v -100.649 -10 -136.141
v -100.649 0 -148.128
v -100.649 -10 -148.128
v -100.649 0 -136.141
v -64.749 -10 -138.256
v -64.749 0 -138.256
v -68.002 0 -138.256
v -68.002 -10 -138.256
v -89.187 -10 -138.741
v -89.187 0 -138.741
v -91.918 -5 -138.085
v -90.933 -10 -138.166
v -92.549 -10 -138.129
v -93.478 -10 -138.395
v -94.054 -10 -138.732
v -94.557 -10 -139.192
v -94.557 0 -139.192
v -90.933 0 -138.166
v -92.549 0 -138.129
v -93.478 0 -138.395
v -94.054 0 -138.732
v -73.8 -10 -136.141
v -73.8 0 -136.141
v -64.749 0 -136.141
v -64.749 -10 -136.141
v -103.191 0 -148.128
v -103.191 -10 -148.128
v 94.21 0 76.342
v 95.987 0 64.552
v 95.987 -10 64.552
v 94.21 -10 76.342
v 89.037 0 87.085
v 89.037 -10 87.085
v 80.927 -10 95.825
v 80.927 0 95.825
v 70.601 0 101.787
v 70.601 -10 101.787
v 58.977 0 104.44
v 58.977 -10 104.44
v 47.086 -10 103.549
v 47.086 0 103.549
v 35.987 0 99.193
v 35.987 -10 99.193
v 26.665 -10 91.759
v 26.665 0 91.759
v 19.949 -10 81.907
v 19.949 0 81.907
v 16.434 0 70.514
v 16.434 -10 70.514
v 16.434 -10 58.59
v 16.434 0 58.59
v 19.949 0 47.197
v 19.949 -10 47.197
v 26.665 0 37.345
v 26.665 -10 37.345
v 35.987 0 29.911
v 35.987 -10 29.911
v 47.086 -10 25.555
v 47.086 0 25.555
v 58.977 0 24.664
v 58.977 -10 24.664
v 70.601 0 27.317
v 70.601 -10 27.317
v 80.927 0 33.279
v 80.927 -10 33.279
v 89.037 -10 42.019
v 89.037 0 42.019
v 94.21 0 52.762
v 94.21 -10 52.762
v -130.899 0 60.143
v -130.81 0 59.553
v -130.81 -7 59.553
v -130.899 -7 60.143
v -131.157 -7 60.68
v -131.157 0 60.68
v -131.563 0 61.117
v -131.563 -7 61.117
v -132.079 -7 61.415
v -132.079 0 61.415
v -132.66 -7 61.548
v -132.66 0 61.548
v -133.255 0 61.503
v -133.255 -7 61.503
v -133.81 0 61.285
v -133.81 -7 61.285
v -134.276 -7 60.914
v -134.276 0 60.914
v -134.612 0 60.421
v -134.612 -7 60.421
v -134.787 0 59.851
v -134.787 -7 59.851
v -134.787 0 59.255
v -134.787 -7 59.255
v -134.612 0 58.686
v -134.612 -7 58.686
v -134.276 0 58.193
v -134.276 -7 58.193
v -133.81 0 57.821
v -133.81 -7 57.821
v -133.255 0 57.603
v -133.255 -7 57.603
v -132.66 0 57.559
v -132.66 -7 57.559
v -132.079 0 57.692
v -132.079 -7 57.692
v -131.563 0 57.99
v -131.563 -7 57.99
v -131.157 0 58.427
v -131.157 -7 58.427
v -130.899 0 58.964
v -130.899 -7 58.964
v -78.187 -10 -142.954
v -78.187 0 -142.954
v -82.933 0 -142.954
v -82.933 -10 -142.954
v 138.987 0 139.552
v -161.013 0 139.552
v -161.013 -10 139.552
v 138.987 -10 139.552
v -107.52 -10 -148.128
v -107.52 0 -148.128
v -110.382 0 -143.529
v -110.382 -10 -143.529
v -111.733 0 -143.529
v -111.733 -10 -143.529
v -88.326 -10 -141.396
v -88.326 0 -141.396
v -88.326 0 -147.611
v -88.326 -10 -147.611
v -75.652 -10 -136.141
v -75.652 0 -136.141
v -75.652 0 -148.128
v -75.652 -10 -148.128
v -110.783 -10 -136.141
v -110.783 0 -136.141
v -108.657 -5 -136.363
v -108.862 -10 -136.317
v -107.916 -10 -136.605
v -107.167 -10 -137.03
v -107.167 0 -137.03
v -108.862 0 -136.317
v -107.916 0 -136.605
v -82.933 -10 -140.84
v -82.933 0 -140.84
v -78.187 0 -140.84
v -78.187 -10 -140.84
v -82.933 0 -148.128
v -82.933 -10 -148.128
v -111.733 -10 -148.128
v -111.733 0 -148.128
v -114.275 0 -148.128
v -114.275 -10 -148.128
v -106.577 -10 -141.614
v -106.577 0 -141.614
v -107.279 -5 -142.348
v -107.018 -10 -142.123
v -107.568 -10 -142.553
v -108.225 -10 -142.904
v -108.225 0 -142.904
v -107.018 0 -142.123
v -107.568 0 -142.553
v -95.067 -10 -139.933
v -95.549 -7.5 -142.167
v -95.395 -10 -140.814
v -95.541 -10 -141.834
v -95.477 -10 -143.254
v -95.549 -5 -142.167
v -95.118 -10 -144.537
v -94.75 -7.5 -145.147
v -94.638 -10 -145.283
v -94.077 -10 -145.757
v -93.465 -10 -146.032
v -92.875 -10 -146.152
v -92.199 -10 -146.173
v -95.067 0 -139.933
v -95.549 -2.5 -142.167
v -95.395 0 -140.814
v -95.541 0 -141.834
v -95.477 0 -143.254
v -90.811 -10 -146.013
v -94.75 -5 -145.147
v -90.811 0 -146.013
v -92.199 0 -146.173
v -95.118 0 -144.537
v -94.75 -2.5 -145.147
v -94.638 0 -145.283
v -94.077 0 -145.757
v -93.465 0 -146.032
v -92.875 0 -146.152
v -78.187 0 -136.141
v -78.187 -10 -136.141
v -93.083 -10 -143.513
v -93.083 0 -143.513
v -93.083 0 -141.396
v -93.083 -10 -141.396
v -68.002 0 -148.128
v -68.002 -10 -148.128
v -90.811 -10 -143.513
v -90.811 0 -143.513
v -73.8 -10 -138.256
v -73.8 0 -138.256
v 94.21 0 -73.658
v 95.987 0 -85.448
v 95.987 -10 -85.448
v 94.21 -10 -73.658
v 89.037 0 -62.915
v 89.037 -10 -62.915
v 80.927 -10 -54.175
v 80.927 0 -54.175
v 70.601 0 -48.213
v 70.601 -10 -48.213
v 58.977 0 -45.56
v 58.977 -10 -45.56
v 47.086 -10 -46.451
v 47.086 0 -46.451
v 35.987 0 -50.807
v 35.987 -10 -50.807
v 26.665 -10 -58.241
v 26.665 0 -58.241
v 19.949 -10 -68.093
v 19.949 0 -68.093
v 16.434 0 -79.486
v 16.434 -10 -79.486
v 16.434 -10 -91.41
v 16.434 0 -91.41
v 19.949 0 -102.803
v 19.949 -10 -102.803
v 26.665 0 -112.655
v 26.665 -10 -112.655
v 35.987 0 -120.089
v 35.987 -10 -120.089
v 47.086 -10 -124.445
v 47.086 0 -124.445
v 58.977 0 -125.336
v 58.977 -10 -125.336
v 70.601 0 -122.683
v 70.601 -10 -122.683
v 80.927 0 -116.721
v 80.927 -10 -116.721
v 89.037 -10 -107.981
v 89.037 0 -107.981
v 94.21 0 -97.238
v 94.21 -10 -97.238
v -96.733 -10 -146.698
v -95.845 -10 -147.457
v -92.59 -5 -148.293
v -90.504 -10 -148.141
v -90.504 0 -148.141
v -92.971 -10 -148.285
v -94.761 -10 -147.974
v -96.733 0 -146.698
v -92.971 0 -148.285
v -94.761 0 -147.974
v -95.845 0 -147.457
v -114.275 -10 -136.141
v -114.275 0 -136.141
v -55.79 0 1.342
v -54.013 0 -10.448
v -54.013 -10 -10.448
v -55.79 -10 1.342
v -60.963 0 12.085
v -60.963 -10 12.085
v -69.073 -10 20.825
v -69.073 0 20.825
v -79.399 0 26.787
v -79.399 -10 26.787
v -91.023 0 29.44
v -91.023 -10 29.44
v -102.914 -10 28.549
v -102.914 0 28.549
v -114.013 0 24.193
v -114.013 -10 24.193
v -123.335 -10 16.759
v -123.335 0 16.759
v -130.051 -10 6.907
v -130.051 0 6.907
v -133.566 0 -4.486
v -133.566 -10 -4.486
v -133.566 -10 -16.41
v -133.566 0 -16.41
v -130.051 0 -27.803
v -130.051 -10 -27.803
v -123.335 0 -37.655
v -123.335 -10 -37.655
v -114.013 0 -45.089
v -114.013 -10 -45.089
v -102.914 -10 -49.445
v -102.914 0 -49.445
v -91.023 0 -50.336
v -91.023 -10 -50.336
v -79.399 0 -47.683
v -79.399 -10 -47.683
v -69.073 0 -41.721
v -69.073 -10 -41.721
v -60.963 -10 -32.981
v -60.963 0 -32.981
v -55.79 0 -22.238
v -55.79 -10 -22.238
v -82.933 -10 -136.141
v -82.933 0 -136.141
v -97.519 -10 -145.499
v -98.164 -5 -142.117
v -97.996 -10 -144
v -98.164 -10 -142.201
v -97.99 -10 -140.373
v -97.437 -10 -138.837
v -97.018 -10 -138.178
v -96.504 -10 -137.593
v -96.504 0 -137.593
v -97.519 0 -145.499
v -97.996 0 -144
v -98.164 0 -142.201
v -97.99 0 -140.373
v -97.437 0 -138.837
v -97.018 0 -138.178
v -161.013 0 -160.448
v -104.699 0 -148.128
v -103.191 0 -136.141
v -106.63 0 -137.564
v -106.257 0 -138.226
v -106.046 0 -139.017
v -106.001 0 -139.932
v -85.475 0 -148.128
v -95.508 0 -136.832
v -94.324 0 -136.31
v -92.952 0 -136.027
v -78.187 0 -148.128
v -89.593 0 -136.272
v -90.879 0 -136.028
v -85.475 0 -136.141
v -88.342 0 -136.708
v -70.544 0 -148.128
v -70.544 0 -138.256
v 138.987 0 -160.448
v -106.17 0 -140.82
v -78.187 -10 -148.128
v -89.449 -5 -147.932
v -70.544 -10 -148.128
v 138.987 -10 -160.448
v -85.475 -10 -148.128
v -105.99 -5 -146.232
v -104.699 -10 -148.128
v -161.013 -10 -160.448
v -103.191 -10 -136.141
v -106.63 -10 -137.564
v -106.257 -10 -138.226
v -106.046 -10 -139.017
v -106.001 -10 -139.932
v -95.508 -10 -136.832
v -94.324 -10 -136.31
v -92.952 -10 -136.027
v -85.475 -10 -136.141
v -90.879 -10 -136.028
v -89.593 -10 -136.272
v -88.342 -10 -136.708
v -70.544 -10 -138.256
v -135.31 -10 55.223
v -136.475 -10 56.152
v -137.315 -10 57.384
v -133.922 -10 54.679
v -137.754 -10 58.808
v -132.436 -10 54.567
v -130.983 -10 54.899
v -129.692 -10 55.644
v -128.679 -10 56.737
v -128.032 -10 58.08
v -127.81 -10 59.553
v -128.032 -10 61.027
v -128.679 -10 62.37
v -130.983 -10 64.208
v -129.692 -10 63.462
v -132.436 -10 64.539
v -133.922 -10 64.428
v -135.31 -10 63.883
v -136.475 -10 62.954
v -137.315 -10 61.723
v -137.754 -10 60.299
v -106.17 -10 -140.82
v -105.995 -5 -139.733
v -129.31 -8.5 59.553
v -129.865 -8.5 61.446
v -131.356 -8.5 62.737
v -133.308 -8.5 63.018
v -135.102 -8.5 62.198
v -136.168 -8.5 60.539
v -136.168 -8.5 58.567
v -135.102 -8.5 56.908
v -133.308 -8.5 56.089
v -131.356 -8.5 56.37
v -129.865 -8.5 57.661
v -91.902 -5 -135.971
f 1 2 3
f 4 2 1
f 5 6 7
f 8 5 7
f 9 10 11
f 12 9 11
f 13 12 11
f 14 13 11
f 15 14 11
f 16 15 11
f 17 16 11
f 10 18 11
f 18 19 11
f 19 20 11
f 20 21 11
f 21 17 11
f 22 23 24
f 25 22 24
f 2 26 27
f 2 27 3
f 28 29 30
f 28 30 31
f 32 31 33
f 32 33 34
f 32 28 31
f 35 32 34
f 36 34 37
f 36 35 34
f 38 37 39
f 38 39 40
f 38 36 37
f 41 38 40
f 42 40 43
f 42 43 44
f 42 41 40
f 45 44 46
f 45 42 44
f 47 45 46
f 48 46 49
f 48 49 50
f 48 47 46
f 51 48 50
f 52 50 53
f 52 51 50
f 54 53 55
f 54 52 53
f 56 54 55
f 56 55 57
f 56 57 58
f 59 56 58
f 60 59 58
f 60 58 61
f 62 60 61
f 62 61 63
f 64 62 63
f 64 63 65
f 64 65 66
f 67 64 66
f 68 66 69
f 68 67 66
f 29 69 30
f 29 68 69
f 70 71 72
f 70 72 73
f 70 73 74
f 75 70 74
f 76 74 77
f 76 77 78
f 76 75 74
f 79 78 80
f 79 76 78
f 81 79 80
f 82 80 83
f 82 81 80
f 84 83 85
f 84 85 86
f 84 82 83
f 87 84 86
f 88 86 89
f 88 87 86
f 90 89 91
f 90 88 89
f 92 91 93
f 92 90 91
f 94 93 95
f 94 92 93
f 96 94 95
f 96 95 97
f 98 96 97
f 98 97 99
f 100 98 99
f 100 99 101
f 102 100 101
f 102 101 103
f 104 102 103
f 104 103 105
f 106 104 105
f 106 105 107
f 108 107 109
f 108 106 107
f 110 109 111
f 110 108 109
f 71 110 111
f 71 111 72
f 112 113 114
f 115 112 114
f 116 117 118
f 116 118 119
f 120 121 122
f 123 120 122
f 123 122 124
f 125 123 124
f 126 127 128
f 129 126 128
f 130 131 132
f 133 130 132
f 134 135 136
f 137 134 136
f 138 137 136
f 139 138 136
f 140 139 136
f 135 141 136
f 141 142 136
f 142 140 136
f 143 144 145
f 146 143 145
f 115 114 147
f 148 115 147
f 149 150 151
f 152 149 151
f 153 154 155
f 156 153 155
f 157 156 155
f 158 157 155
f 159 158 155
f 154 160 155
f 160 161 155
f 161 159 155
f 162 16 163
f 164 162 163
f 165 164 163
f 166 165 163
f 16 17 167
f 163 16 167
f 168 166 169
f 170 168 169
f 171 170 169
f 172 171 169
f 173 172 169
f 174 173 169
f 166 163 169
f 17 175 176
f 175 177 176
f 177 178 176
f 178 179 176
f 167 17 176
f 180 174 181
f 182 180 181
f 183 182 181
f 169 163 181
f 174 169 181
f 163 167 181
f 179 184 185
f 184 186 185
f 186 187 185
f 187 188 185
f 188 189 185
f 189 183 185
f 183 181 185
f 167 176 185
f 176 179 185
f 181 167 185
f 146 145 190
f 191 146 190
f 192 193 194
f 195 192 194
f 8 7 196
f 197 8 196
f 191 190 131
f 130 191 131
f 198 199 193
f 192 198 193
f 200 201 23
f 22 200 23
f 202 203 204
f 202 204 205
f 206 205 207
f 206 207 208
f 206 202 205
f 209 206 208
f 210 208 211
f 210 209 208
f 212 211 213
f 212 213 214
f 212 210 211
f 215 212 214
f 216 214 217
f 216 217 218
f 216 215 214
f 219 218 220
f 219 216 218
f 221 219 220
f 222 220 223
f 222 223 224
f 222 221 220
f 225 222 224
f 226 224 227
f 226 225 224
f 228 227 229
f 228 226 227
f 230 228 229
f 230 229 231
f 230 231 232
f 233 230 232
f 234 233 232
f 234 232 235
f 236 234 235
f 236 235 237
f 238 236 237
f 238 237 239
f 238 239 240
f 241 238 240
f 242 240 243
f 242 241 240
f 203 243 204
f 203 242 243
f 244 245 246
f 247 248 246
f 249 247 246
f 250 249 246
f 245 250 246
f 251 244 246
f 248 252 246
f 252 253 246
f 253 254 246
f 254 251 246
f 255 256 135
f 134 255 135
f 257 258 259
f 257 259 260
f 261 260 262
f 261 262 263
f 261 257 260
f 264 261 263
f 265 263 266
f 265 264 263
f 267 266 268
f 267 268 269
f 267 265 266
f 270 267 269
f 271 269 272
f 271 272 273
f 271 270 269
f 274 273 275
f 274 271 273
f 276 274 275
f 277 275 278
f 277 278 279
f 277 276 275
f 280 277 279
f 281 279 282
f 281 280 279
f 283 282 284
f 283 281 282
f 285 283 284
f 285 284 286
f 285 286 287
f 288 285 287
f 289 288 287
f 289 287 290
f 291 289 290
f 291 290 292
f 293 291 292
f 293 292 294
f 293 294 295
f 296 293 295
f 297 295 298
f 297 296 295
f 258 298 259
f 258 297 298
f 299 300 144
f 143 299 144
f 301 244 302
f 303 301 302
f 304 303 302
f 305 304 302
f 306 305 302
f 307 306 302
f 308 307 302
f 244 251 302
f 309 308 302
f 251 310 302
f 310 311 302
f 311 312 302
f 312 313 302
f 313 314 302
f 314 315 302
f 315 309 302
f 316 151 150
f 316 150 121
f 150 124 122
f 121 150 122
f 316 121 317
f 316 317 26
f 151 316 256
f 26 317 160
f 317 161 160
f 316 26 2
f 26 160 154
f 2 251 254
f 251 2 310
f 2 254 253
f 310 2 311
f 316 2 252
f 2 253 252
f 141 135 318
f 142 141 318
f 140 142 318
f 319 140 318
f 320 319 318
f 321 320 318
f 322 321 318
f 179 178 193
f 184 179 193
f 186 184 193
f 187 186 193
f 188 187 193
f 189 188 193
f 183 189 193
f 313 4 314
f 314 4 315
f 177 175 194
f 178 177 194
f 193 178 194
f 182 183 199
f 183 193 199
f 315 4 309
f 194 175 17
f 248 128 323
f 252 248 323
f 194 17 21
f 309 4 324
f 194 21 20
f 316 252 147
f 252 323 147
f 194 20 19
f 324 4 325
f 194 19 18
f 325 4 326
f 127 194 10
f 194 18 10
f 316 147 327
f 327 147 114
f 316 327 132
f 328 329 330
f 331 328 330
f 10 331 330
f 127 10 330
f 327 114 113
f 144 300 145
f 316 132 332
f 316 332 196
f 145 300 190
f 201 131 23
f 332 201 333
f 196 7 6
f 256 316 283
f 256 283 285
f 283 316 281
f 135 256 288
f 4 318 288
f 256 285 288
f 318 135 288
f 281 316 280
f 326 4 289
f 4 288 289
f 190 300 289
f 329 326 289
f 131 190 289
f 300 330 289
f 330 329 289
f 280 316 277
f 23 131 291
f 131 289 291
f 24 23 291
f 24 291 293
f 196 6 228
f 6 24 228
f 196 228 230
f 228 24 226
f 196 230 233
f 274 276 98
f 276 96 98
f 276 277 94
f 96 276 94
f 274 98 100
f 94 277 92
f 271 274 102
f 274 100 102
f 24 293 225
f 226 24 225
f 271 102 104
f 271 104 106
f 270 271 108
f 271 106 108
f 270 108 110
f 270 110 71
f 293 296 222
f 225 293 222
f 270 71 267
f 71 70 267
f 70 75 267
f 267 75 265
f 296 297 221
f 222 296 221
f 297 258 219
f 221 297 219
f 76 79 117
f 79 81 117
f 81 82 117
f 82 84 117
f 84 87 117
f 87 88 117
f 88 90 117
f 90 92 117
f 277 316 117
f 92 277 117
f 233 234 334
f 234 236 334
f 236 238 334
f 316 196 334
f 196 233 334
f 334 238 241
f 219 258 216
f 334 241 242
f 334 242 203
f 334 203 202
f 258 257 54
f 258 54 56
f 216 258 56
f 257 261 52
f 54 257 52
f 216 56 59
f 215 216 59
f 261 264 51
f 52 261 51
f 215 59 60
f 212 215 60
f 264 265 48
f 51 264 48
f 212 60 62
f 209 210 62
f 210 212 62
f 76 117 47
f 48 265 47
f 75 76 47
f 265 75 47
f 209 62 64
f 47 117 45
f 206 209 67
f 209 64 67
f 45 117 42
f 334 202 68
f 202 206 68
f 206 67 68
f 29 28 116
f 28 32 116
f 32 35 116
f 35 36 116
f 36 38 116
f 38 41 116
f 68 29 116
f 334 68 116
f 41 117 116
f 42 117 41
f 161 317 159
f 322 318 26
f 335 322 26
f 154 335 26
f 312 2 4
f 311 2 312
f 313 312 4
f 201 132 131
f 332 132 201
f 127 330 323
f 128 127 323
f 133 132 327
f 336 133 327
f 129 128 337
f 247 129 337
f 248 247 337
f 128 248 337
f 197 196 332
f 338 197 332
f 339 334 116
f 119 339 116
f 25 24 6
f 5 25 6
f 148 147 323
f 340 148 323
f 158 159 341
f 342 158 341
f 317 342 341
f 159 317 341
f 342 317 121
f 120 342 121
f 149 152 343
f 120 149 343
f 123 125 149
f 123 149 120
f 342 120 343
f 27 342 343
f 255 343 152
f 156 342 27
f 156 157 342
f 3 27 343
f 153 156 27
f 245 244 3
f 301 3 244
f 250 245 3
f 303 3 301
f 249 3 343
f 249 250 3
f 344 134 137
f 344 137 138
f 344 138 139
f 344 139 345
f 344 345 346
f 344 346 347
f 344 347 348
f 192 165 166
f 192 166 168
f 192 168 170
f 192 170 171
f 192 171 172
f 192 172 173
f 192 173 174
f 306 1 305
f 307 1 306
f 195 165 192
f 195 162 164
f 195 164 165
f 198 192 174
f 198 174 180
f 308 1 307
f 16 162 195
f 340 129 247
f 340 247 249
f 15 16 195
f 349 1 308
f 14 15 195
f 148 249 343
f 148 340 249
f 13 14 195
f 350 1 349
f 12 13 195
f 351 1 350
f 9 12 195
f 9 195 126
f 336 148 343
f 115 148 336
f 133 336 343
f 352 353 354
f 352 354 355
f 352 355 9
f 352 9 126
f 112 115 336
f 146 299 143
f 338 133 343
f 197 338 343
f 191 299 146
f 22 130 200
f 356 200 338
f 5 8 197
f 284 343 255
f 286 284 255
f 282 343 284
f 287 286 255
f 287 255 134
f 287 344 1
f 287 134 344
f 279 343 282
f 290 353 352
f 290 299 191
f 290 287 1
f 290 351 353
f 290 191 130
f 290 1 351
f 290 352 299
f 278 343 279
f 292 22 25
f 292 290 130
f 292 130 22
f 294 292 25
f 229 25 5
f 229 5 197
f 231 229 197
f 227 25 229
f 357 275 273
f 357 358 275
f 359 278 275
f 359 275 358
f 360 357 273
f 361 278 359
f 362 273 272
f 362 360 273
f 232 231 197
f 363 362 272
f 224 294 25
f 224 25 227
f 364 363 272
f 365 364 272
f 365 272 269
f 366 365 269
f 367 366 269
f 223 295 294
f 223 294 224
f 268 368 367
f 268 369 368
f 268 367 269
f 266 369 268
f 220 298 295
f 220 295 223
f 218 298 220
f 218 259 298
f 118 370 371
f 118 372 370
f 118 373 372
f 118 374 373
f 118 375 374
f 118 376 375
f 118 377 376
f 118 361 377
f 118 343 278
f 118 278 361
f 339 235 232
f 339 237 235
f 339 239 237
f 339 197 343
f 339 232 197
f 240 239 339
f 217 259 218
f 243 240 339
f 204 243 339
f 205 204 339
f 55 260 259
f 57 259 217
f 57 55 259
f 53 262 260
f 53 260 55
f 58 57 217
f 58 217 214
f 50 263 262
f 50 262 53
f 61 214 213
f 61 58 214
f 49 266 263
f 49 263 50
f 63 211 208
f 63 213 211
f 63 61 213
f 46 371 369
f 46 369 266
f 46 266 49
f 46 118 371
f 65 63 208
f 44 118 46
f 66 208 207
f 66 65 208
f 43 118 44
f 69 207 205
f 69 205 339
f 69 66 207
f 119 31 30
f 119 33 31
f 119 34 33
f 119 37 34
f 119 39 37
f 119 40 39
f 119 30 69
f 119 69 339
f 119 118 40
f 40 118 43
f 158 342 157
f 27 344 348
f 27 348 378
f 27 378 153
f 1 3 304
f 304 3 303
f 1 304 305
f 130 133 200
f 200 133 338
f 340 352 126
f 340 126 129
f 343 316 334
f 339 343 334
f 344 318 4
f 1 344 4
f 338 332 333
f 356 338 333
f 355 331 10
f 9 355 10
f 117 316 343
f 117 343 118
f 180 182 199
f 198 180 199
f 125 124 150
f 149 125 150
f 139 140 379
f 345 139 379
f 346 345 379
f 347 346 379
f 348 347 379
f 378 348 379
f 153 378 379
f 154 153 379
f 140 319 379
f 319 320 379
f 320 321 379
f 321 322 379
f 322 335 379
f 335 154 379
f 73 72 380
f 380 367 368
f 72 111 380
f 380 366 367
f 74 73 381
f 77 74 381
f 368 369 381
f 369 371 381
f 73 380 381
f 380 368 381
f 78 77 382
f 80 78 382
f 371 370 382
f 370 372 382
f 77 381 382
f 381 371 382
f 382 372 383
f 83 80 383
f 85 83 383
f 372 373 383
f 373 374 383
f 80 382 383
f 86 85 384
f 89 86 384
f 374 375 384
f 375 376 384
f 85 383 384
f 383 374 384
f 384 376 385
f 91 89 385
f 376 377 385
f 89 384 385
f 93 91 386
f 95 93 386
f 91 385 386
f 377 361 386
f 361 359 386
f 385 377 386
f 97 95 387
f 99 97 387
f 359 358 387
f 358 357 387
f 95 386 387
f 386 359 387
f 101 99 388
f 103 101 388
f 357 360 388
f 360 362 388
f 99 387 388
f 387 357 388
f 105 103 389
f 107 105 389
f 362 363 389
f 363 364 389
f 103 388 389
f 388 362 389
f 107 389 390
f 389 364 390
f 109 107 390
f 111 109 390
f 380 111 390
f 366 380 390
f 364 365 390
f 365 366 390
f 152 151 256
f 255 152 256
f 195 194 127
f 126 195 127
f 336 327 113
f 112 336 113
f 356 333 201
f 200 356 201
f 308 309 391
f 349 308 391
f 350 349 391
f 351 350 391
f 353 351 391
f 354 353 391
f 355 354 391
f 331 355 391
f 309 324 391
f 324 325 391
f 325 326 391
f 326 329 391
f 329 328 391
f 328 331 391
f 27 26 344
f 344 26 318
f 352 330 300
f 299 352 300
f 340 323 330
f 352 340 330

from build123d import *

# Parameters (mm, degrees)
F0_W     = 300
F0_H     = 300
F0_W_2   = 2.5421465495
F0_H_2   = 11.9866538541
F0_R     = 40
F0_R_2   = 2
F1_DEPTH = 10
F2_SIZE  = 3


with BuildPart() as f1:
    # F0 (on Front) → F1 (new body)
    with BuildSketch(Plane.XZ):
        with Locations((-11.0126920044, -10.4479454458)):
            Rectangle(F0_W, F0_H)
        with BuildLine():
            Line((-110.3819430217, -143.5288141009), (-111.7330322611, -143.5288141009))
            Line((-111.7330322611, -143.5288141009), (-111.7330322611, -148.1277644634))
            Line((-111.7330322611, -148.1277644634), (-114.2751788106, -148.1277644634))
            Line((-114.2751788106, -148.1277644634), (-114.2751788106, -136.1411106094))
            Line((-114.2751788106, -136.1411106094), (-110.7833345822, -136.1411106094))
            add(Edge.make_bspline(
                [(-110.7833345822, -136.1411106094), (-108.33825658, -136.1411106094), (-107.1668753268, -137.0304683805)],
                knots=[0, 0, 0, 1, 1, 1], degree=2))
            add(Edge.make_bspline(
                [(-107.1668753268, -137.0304683805), (-105.9954940736, -137.9198261517), (-105.9954940736, -139.7326468594)],
                knots=[0, 0, 0, 1, 1, 1], degree=2))
            add(Edge.make_bspline(
                [(-105.9954940736, -139.7326468594), (-105.9954940736, -140.7899069826), (-106.5765936202, -141.6136778975)],
                knots=[0, 0, 0, 1, 1, 1], degree=2))
            add(Edge.make_bspline(
                [(-106.5765936202, -141.6136778975), (-107.1576931669, -142.4374488124), (-108.2254471872, -142.9044272291)],
                knots=[0, 0, 0, 1, 1, 1], degree=2))
            add(Edge.make_bspline(
                [(-108.2254471872, -142.9044272291), (-105.5180217599, -146.9472010504), (-104.6994977935, -148.1277644634)],
                knots=[0, 0, 0, 1, 1, 1], degree=2))
            Line((-104.6994977935, -148.1277644634), (-107.5197326136, -148.1277644634))
            Line((-107.5197326136, -148.1277644634), (-110.3819430217, -143.5288141009))
        make_face(mode=Mode.SUBTRACT)
        with Locations((-101.9199268242, -142.1344375364)):
            Rectangle(F0_W_2, F0_H_2, mode=Mode.SUBTRACT)
        with BuildLine():
            Line((-93.0827538088, -143.5130732554), (-93.0827538088, -141.3959295347))
            Line((-93.0827538088, -141.3959295347), (-88.3263949913, -141.3959295347))
            Line((-88.3263949913, -141.3959295347), (-88.3263949913, -147.6109400359))
            add(Edge.make_bspline(
                [(-88.3263949913, -147.6109400359), (-89.4833471361, -147.9887203281), (-90.5038786198, -148.1408818347)],
                knots=[0, 0, 0, 1, 1, 1], degree=2))
            add(Edge.make_bspline(
                [(-90.5038786198, -148.1408818347), (-91.5244101036, -148.2930433413), (-92.5895406496, -148.2930433413)],
                knots=[0, 0, 0, 1, 1, 1], degree=2))
            add(Edge.make_bspline(
                [(-92.5895406496, -148.2930433413), (-95.3022130254, -148.2930433413), (-96.7333182295, -146.6979709965)],
                knots=[0, 0, 0, 1, 1, 1], degree=2))
            add(Edge.make_bspline(
                [(-96.7333182295, -146.6979709965), (-98.1644234335, -145.1028986517), (-98.1644234335, -142.1173849538)],
                knots=[0, 0, 0, 1, 1, 1], degree=2))
            add(Edge.make_bspline(
                [(-98.1644234335, -142.1173849538), (-98.1644234335, -139.2158224319), (-96.5037642325, -137.5932036074)],
                knots=[0, 0, 0, 1, 1, 1], degree=2))
            add(Edge.make_bspline(
                [(-96.5037642325, -137.5932036074), (-94.8431050314, -135.970584783), (-91.9021903958, -135.970584783)],
                knots=[0, 0, 0, 1, 1, 1], degree=2))
            add(Edge.make_bspline(
                [(-91.9021903958, -135.970584783), (-90.0552645229, -135.970584783), (-88.3421358368, -136.7077810476)],
                knots=[0, 0, 0, 1, 1, 1], degree=2))
            Line((-88.3421358368, -136.7077810476), (-89.1868945457, -138.7409735924))
            add(Edge.make_bspline(
                [(-89.1868945457, -138.7409735924), (-90.4986316713, -138.0851050296), (-91.9179312413, -138.0851050296)],
                knots=[0, 0, 0, 1, 1, 1], degree=2))
            add(Edge.make_bspline(
                [(-91.9179312413, -138.0851050296), (-93.5654730711, -138.0851050296), (-94.557146338, -139.1922111636)],
                knots=[0, 0, 0, 1, 1, 1], degree=2))
            add(Edge.make_bspline(
                [(-94.557146338, -139.1922111636), (-95.548819605, -140.2993172976), (-95.548819605, -142.1672309645)],
                knots=[0, 0, 0, 1, 1, 1], degree=2))
            add(Edge.make_bspline(
                [(-95.548819605, -142.1672309645), (-95.548819605, -144.1190958075), (-94.7499716955, -145.147497714)],
                knots=[0, 0, 0, 1, 1, 1], degree=2))
            add(Edge.make_bspline(
                [(-94.7499716955, -145.147497714), (-93.951123786, -146.1758996205), (-92.426885246, -146.1758996205)],
                knots=[0, 0, 0, 1, 1, 1], degree=2))
            add(Edge.make_bspline(
                [(-92.426885246, -146.1758996205), (-91.6293490736, -146.1758996205), (-90.8108251072, -146.0132442169)],
                knots=[0, 0, 0, 1, 1, 1], degree=2))
            Line((-90.8108251072, -146.0132442169), (-90.8108251072, -143.5130732554))
            Line((-90.8108251072, -143.5130732554), (-93.0827538088, -143.5130732554))
        make_face(mode=Mode.SUBTRACT)
        Polygon((-75.6523908834, -136.1411106094), (-75.6523908834, -148.1277644634), (-78.1866670101, -148.1277644634), (-78.1866670101, -142.9542732399), (-82.9325319307, -142.9542732399), (-82.9325319307, -148.1277644634), (-85.4746784801, -148.1277644634), (-85.4746784801, -136.1411106094), (-82.9325319307, -136.1411106094), (-82.9325319307, -140.8397529934), (-78.1866670101, -140.8397529934), (-78.1866670101, -136.1411106094), align=None, mode=Mode.SUBTRACT)
        Polygon((-68.0023399667, -138.2556308559), (-68.0023399667, -148.1277644634), (-70.5444865162, -148.1277644634), (-70.5444865162, -138.2556308559), (-73.800218062, -138.2556308559), (-73.800218062, -136.1411106094), (-64.7492318951, -136.1411106094), (-64.7492318951, -138.2556308559), align=None, mode=Mode.SUBTRACT)
        with Locations((55.9873079956, -85.4479454458)):
            Circle(F0_R, mode=Mode.SUBTRACT)
        with Locations((-94.0126920044, -10.4479454458)):
            Circle(F0_R, mode=Mode.SUBTRACT)
        with Locations((-132.8097879887, 59.5533102751)):
            Circle(F0_R_2, mode=Mode.SUBTRACT)
        with Locations((55.9873079956, 64.5520545542)):
            Circle(F0_R, mode=Mode.SUBTRACT)
    extrude(amount=F1_DEPTH)

    # F2
    f2_edges = [f1.edges().sort_by_distance(p)[0] for p in [
        (-134.809788, -10, 59.55331),
    ]]
    chamfer(f2_edges, length=F2_SIZE)


solid = f1.part
